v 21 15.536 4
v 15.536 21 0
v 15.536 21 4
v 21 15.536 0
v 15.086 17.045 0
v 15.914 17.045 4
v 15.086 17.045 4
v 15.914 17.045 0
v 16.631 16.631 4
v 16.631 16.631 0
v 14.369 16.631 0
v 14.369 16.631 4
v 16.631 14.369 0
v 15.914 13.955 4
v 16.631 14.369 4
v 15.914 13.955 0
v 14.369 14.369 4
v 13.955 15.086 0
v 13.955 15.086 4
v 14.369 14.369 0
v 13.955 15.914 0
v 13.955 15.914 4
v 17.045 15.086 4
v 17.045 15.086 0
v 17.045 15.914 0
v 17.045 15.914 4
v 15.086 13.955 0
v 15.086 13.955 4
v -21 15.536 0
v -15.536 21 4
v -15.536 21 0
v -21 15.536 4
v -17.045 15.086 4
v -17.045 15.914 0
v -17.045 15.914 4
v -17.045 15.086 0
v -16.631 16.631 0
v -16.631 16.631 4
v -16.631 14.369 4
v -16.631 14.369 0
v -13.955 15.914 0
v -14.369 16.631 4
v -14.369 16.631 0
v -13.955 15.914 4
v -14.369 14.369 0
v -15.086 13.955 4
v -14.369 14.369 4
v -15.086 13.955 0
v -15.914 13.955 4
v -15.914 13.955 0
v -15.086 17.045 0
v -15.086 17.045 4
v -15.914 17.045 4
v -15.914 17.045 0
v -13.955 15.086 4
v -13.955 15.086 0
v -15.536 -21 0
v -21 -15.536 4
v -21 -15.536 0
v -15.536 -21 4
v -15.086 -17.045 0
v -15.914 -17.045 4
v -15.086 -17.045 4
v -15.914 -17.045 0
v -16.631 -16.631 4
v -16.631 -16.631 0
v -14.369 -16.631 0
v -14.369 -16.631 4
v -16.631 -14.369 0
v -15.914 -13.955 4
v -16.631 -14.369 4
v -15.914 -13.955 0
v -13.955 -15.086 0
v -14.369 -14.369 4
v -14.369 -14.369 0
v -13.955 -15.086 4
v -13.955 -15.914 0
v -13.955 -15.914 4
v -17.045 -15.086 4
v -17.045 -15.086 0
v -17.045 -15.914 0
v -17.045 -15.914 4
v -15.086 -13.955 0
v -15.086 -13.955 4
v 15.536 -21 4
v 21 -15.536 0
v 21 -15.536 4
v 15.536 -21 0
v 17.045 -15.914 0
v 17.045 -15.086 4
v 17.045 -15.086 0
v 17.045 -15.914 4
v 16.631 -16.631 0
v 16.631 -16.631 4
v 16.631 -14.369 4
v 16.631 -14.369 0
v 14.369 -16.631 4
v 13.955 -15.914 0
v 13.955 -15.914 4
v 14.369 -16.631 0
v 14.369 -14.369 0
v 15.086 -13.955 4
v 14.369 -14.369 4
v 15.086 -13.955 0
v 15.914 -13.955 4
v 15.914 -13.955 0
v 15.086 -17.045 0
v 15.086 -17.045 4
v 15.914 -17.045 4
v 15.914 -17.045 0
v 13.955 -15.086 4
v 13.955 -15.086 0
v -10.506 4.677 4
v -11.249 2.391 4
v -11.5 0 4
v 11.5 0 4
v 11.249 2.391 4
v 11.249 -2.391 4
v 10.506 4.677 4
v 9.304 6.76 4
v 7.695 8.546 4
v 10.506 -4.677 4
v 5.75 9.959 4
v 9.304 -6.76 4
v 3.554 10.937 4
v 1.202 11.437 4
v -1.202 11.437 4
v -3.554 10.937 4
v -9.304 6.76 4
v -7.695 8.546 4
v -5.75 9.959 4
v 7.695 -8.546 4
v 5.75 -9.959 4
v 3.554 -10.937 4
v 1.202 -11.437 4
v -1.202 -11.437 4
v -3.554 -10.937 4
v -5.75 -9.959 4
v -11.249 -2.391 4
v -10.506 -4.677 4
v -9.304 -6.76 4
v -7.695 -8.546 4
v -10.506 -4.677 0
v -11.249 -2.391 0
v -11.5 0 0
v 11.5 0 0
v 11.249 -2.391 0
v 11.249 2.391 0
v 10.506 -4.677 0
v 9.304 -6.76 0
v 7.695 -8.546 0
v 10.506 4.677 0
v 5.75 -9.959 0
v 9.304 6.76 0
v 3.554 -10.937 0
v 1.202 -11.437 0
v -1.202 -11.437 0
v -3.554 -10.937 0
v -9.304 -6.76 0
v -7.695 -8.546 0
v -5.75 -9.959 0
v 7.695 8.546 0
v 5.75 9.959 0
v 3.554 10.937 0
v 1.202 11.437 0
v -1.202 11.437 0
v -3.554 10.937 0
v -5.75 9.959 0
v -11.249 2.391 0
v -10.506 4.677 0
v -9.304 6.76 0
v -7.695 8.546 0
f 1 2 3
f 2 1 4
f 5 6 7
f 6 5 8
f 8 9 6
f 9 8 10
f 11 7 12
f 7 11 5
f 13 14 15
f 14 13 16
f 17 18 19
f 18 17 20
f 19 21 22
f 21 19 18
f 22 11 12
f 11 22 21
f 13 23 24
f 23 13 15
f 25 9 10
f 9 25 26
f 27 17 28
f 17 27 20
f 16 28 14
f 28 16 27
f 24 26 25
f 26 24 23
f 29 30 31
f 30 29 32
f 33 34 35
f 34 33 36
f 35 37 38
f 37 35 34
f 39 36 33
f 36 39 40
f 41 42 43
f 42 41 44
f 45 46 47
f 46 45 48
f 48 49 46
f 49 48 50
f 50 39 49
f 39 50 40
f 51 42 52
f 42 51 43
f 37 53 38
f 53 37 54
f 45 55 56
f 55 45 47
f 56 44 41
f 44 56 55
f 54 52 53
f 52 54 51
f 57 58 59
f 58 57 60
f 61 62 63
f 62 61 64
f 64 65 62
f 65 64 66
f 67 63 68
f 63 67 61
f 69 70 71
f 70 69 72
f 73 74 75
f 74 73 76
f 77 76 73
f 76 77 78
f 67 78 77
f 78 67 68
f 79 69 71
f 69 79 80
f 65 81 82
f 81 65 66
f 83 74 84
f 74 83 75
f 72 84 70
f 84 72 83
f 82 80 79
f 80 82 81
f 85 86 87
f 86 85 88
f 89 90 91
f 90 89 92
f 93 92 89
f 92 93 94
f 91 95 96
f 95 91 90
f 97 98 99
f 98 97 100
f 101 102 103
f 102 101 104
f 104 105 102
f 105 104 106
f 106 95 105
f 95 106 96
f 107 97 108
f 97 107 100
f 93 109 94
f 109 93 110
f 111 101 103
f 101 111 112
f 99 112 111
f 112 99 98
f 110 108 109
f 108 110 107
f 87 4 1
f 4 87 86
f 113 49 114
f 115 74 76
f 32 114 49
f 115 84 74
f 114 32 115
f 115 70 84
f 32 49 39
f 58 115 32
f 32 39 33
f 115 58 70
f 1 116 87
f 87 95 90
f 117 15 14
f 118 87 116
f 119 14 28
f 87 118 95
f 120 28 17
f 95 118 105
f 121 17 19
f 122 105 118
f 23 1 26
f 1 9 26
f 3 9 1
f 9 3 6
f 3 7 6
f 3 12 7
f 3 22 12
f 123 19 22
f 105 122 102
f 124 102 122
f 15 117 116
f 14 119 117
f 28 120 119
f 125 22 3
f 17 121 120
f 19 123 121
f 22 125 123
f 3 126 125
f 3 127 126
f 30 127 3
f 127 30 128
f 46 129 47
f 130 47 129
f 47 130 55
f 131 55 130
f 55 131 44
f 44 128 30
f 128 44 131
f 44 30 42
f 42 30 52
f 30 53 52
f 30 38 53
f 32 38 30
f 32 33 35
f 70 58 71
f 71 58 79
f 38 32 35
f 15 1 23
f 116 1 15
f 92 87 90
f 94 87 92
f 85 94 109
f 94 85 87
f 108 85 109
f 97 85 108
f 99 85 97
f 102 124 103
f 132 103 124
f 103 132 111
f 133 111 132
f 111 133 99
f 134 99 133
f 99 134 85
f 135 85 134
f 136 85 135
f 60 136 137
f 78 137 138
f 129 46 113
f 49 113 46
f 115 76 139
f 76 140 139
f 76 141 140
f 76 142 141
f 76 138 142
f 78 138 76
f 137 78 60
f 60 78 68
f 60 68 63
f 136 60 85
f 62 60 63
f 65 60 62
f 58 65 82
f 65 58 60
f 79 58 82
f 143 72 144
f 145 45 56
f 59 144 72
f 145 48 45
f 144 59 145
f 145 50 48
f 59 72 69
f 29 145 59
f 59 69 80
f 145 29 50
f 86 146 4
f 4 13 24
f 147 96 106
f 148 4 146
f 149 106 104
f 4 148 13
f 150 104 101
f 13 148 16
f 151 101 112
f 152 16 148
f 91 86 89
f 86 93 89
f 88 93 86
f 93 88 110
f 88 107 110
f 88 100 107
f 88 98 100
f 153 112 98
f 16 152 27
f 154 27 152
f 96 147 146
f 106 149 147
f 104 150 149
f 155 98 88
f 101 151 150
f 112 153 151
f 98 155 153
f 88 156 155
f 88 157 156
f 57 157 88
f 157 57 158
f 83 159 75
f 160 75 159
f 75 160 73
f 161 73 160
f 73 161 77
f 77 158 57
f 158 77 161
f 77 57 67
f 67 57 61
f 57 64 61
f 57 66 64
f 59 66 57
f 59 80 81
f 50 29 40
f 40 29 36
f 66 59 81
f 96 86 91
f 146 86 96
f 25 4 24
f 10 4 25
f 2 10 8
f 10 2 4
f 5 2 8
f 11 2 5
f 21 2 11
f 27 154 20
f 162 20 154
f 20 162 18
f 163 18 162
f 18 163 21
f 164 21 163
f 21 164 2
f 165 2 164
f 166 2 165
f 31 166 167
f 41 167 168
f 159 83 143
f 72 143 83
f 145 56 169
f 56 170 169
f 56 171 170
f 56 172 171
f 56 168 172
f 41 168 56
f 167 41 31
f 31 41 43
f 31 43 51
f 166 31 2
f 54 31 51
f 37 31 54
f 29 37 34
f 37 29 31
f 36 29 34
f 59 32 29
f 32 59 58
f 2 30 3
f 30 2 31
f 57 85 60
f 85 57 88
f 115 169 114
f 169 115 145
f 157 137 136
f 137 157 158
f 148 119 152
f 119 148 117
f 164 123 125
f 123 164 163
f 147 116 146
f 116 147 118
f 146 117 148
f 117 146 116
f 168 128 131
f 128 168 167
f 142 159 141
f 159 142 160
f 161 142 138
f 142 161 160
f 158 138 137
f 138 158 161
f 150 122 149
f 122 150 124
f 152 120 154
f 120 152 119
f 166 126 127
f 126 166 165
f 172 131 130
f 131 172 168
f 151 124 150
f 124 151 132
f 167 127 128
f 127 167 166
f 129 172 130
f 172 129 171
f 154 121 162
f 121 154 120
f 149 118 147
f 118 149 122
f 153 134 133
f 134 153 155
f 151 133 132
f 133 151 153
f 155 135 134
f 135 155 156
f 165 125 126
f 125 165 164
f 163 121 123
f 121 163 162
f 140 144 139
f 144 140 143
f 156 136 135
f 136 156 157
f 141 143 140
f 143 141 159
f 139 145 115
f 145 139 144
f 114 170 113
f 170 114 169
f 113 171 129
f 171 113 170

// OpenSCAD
thickness=4;
hole_pitch=31;//26;
rad = 6;
notch = false;

module NEMA17_spacer(){
	//body
	difference(){
		translate([0,0,thickness/2]) cube([hole_pitch+11,hole_pitch+11,thickness],center=true);
		for(i=[0,1,2,3]){
			rotate([0,0,i*90+45]) union() {
				//translate([(hole_pitch-8)*sqrt(2)+2.5-2.5/sqrt(2),0,thickness/2]) {
				translate([(hole_pitch+11)*sqrt(2)/2-4.5*sqrt(2)+5,0,thickness/2]) {
					cube([5,10,thickness+.2],center=true);
				}
				translate([sqrt(2)*hole_pitch/2,0,0]) cylinder(r=3.2/2,h=thickness*4,center=true,$fn=12);
			}
			
		}
		cylinder(r=23/2,h=thickness*2.2,center=true); // Changed from 22.4 - AB

	// Corner notch added by AB
		if(notch)
		{
			translate([-hole_pitch/2+3,hole_pitch/2-1,0]) 
			{
					cylinder(r=rad, h=thickness*4,center=true,$fn=20);
					translate([-rad,3,0])
						cube([2*rad,2*rad+6,thickness*4],center=true);
					rotate([0,0,-45])
					translate([-3,rad+3,0])
						cube([2*rad+6,2*rad+6,thickness*4],center=true);
			}
		}
	}
}

NEMA17_spacer();
